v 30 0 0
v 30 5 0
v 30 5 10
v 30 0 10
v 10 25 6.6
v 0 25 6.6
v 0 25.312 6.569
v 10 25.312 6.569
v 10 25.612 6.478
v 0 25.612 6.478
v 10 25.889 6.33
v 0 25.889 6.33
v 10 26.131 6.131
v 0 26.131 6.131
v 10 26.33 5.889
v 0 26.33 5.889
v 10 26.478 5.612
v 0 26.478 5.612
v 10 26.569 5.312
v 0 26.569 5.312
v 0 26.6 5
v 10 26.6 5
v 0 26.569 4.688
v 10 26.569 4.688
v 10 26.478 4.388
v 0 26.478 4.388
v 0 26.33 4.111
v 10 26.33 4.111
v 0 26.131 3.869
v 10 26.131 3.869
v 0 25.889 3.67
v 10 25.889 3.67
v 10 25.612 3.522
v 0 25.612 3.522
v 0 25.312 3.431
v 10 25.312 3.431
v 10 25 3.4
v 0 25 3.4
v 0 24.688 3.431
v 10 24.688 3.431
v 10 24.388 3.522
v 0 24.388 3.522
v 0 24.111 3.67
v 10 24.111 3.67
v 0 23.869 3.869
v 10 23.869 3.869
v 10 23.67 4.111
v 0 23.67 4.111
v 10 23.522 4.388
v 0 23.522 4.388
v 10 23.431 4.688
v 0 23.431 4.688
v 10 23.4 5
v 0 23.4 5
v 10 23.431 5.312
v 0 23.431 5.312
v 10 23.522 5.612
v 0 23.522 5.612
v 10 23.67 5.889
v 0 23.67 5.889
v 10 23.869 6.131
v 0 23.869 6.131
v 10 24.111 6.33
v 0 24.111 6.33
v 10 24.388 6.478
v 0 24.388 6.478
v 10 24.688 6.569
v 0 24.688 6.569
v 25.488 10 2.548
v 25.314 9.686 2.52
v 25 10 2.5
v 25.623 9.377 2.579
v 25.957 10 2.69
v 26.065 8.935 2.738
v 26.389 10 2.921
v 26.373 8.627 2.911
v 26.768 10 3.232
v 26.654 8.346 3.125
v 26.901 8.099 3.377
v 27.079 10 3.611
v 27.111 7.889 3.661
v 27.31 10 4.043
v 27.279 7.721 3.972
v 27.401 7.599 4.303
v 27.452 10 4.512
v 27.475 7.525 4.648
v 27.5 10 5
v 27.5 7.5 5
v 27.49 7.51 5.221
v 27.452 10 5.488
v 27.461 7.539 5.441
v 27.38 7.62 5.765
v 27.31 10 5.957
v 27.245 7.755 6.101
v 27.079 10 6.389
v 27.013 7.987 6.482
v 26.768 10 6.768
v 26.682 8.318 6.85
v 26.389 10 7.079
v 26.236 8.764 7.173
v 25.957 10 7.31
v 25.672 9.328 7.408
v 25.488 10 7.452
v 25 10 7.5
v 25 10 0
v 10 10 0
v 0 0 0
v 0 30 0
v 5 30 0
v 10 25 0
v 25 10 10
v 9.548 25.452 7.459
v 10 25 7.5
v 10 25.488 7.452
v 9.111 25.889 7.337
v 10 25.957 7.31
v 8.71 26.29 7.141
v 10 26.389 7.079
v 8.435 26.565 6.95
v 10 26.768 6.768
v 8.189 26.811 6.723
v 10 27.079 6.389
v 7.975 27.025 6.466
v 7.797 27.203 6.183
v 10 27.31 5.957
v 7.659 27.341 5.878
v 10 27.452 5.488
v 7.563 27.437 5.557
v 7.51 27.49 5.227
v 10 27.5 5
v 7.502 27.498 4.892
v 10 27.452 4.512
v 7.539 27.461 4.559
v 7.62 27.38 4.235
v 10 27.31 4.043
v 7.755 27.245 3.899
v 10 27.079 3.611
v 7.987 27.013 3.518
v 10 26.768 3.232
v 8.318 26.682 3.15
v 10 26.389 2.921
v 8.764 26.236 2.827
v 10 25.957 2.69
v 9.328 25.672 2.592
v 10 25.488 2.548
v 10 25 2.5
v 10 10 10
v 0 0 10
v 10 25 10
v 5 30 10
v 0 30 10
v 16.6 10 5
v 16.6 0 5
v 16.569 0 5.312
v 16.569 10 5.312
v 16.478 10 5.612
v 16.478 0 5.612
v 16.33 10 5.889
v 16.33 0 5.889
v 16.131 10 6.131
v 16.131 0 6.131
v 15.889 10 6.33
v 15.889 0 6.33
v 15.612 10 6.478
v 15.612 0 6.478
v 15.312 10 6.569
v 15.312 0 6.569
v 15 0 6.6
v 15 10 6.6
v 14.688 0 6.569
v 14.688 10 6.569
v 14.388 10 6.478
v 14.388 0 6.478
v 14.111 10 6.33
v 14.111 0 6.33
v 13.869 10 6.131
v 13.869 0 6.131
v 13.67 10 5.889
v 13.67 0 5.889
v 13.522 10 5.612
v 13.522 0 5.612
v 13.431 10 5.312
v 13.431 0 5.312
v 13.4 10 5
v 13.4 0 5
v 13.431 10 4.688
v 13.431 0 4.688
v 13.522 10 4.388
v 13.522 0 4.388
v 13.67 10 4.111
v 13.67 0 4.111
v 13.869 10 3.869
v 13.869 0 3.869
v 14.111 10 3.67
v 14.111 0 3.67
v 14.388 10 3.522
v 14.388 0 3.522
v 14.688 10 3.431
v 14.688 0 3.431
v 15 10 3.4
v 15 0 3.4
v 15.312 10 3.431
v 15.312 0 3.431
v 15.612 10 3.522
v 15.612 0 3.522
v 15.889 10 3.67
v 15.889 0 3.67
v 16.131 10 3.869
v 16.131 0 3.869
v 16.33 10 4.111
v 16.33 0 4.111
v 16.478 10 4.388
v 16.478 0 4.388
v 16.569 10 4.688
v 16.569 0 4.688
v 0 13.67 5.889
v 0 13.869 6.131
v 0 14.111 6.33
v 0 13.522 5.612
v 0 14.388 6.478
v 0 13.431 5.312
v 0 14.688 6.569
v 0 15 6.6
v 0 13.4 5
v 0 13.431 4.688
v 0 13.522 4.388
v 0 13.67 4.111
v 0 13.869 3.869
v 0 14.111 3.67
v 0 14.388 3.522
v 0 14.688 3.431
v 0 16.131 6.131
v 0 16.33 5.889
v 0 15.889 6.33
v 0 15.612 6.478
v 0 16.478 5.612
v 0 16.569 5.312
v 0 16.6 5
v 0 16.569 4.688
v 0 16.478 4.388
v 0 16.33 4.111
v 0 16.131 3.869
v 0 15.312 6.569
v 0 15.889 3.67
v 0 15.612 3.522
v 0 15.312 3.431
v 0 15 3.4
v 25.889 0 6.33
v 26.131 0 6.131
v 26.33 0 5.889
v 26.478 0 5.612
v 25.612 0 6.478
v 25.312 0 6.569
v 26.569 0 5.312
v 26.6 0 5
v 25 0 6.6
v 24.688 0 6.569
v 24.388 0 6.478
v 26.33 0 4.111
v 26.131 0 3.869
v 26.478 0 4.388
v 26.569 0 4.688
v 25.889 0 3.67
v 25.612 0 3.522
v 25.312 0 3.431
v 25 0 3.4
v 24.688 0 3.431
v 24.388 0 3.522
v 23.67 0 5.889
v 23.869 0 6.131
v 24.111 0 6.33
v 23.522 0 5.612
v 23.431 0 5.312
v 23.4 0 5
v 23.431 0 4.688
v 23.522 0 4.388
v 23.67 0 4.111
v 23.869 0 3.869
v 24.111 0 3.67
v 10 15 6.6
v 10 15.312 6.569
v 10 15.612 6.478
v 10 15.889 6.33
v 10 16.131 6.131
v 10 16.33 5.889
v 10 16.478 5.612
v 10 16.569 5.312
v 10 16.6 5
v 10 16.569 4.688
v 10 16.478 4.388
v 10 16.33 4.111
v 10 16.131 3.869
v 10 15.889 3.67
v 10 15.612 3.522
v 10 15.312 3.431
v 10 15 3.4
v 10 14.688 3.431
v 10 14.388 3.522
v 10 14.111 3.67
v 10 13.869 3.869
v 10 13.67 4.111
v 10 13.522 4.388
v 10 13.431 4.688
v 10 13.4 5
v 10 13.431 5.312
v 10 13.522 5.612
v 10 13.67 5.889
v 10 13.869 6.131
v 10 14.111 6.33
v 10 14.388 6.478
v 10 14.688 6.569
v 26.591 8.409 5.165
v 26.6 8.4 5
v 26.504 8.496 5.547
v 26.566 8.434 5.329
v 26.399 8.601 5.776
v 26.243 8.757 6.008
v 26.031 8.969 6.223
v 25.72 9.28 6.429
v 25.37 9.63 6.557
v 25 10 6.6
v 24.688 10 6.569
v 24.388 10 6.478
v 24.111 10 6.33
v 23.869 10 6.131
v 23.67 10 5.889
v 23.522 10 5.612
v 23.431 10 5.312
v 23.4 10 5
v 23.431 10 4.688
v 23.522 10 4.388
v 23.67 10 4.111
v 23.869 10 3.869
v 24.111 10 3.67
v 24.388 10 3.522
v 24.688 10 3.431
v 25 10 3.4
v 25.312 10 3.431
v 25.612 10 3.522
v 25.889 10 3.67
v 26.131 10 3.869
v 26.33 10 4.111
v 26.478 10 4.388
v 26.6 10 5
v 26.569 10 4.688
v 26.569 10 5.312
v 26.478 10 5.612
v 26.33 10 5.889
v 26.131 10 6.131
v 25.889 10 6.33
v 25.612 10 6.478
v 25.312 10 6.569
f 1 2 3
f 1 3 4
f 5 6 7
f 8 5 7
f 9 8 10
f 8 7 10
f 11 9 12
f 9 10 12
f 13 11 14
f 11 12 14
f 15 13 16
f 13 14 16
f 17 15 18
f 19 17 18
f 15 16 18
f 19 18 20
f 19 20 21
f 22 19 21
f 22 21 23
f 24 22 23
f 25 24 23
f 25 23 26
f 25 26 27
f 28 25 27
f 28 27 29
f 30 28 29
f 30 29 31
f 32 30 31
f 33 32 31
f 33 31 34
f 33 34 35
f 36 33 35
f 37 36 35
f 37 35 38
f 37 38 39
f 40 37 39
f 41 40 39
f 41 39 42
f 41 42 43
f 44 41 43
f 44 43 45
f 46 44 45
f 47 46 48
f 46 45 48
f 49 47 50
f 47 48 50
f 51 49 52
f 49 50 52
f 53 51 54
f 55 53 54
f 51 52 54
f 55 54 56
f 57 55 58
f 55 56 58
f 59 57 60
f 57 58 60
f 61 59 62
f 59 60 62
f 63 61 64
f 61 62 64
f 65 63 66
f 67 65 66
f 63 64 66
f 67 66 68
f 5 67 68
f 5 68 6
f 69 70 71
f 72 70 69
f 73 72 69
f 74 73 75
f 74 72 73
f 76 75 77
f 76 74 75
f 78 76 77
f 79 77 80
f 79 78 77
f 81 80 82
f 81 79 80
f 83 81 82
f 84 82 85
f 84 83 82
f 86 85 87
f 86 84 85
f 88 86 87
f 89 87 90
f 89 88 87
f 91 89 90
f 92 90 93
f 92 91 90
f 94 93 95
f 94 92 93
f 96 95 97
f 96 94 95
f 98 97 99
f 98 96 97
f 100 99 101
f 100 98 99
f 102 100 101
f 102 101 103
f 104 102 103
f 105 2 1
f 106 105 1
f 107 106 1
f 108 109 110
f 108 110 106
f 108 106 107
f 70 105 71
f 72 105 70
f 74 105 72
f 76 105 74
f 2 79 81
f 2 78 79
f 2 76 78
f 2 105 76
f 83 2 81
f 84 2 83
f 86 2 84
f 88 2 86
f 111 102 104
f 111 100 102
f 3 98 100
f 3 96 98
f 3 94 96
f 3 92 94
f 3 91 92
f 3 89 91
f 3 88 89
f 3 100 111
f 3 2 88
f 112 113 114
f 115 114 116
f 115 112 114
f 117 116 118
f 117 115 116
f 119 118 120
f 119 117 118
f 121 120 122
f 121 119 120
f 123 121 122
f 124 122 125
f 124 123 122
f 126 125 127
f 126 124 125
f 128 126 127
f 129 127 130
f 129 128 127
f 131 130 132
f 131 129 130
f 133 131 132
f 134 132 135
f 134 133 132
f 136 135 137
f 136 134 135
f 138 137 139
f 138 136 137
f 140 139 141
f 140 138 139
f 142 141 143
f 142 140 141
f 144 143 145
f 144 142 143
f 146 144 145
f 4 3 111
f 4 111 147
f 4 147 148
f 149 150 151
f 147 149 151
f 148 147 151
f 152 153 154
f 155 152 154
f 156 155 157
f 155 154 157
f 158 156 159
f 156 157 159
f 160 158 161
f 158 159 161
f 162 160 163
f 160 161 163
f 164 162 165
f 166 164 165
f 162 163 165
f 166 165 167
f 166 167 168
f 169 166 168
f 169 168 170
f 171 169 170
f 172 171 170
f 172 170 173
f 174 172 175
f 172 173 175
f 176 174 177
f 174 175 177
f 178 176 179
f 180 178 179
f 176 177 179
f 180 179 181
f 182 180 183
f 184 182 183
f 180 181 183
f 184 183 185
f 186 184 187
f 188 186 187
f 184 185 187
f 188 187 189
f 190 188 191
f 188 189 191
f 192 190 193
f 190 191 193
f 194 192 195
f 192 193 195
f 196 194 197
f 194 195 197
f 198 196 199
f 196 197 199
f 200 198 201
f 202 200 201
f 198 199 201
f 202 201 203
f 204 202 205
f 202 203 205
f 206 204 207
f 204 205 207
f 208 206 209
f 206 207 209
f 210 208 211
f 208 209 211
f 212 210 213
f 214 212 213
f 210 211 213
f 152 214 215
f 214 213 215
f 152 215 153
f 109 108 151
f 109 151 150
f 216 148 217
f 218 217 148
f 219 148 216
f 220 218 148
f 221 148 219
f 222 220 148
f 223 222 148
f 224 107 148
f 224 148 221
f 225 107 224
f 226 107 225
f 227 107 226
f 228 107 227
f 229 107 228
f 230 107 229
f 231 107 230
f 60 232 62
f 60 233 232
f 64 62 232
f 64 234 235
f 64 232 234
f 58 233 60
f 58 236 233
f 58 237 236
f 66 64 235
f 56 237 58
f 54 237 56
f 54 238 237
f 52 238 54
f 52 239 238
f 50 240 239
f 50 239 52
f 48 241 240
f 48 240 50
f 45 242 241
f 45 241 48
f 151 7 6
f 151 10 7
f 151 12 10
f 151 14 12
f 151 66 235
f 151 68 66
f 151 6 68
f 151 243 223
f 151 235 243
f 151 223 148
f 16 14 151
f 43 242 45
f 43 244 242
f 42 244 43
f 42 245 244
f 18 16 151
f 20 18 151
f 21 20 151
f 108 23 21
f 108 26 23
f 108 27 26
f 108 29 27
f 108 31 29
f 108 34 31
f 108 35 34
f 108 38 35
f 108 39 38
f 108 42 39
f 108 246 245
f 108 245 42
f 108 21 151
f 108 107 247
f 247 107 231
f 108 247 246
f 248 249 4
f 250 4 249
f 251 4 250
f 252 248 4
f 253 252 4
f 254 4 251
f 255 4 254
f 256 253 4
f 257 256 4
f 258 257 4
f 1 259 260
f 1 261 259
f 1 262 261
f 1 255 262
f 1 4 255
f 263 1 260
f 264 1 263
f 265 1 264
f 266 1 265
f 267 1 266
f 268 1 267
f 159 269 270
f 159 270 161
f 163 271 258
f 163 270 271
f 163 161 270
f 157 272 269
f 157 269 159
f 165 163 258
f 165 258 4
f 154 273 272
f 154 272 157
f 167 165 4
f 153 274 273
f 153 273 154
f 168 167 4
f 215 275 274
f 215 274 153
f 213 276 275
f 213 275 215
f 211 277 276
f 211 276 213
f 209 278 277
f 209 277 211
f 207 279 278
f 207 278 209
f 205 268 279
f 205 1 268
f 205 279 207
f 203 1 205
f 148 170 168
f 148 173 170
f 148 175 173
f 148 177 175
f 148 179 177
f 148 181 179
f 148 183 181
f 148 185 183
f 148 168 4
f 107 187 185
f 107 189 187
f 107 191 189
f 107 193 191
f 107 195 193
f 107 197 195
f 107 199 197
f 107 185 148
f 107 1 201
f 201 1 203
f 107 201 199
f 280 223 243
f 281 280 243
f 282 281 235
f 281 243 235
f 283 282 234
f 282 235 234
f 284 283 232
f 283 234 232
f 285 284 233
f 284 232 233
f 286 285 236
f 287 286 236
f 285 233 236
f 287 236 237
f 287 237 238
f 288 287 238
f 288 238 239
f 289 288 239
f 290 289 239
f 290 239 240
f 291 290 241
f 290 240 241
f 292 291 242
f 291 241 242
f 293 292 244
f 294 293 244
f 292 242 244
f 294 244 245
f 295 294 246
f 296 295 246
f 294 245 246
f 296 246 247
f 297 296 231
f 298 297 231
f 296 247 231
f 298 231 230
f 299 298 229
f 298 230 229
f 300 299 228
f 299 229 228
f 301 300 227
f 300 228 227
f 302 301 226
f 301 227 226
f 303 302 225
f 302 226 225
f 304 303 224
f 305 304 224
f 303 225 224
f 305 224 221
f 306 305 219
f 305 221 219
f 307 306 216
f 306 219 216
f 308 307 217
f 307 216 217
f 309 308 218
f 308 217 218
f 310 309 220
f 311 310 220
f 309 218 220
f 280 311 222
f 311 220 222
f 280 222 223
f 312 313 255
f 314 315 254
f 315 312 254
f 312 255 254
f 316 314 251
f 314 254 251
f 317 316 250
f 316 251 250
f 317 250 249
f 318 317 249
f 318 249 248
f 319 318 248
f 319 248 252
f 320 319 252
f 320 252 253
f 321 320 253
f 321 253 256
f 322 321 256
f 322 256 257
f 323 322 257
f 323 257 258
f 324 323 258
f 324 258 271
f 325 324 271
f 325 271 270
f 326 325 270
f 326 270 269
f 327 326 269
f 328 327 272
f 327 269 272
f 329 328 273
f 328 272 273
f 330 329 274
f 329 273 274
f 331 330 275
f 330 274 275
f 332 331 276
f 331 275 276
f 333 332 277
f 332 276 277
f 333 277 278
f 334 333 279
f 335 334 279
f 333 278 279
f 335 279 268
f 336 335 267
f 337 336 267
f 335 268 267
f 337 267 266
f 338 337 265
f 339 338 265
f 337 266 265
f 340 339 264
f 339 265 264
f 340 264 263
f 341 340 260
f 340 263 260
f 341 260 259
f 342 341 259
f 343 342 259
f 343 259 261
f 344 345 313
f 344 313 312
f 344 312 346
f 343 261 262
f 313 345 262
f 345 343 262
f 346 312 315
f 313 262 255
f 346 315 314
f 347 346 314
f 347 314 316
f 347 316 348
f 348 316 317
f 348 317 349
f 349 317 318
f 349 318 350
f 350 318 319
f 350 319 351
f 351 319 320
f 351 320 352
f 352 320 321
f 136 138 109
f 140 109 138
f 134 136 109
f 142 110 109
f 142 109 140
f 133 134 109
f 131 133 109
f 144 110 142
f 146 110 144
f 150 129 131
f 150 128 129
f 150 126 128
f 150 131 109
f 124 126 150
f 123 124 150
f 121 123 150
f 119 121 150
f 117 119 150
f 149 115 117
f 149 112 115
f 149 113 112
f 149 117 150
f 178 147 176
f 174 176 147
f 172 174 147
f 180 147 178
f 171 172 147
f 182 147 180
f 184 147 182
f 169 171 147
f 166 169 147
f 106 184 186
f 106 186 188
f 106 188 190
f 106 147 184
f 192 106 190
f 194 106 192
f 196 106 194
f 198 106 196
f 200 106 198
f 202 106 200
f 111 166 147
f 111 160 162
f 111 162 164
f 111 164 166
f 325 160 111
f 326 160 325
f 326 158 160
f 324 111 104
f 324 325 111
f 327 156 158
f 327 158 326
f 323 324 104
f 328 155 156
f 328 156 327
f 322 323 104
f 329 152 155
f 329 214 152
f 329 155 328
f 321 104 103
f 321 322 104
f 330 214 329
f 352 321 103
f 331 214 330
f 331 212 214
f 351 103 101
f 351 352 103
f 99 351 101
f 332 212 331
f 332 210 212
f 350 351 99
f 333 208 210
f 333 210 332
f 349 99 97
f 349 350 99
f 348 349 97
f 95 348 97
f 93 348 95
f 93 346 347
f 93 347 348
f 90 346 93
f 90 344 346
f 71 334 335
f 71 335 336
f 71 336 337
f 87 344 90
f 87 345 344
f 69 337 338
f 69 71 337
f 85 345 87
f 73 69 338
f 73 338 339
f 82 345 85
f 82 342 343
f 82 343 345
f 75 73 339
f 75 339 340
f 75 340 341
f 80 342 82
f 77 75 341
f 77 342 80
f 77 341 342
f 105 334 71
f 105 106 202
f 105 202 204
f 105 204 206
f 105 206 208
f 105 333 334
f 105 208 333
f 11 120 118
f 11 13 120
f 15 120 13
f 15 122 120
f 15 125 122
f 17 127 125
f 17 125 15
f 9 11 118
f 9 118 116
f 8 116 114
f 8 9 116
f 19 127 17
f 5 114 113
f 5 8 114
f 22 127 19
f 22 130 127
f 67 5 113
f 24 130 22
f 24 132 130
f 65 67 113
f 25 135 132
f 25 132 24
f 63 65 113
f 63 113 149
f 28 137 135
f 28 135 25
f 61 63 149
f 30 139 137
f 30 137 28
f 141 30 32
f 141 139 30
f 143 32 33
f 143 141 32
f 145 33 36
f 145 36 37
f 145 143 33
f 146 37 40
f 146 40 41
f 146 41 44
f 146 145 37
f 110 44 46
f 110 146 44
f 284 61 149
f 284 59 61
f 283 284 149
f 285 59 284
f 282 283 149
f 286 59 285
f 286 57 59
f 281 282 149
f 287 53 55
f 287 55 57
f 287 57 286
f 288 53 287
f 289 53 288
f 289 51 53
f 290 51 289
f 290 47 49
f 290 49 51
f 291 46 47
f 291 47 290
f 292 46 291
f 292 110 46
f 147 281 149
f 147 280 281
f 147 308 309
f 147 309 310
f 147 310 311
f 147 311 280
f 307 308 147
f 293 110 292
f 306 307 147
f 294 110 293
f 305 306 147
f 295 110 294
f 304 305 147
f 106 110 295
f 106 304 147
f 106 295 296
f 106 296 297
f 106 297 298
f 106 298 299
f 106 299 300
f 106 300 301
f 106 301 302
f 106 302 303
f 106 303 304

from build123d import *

# Parameters (mm, degrees)
AUFSATZ_LINEAR_AUSTRAGEN1_DEPTH = 10
FASE1_SIZE                      = 5
SKIZZE2_R                       = 1.6
SCHNITT_LINEAR_AUSTRAGEN1_DEPTH = 10
SKIZZE3_R                       = 2.5
SKIZZE3_R_2                     = 1.6
AUFSATZ_LINEAR_AUSTRAGEN2_DEPTH = 10
SKIZZE5_R                       = 2.5
SKIZZE5_R_2                     = 1.6
AUFSATZ_LINEAR_AUSTRAGEN3_DEPTH = 10
SKIZZE4_R                       = 1.6
SCHNITT_LINEAR_AUSTRAGEN3_DEPTH = 10


with BuildPart() as part:
    # Skizze1 → Aufsatz-Linear austragen1 (new body)
    with BuildSketch(Plane.XY):
        Polygon((0, 30), (10, 30), (10, 10), (30, 10), (30, 0), (0, 0), align=None)
    extrude(amount=AUFSATZ_LINEAR_AUSTRAGEN1_DEPTH)

    # Fase1
    fase1_edges = [part.edges().sort_by_distance(p)[0] for p in [
        (10, 30, 5),
        (30, 10, 5),
    ]]
    chamfer(fase1_edges, length=FASE1_SIZE)

    # Skizze2 → Schnitt-Linear austragen1 (cut)
    with BuildSketch(Plane.ZY):
        with Locations((5, 15)):
            Circle(SKIZZE2_R)
        with Locations((5, 25)):
            Circle(SKIZZE2_R)
    extrude(amount=-SCHNITT_LINEAR_AUSTRAGEN1_DEPTH, mode=Mode.SUBTRACT)

    # Skizze3 → Aufsatz-Linear austragen2 (add)
    with BuildSketch(Plane.ZY):
        with Locations((5, 25)):
            Circle(SKIZZE3_R)
        with Locations((5, 25)):
            Circle(SKIZZE3_R_2, mode=Mode.SUBTRACT)
    extrude(amount=-AUFSATZ_LINEAR_AUSTRAGEN2_DEPTH)

    # Skizze5 → Aufsatz-Linear austragen3 (add)
    with BuildSketch(Plane.XZ):
        with Locations((25, 5)):
            Circle(SKIZZE5_R)
        with Locations((25, 5)):
            Circle(SKIZZE5_R_2, mode=Mode.SUBTRACT)
    extrude(amount=-AUFSATZ_LINEAR_AUSTRAGEN3_DEPTH)

    # Skizze4 → Schnitt-Linear austragen3 (cut)
    with BuildSketch(Plane.XZ):
        with Locations((15, 5)):
            Circle(SKIZZE4_R)
        with Locations((25, 5)):
            Circle(SKIZZE4_R)
    extrude(amount=-SCHNITT_LINEAR_AUSTRAGEN3_DEPTH, mode=Mode.SUBTRACT)


solid = part.part
